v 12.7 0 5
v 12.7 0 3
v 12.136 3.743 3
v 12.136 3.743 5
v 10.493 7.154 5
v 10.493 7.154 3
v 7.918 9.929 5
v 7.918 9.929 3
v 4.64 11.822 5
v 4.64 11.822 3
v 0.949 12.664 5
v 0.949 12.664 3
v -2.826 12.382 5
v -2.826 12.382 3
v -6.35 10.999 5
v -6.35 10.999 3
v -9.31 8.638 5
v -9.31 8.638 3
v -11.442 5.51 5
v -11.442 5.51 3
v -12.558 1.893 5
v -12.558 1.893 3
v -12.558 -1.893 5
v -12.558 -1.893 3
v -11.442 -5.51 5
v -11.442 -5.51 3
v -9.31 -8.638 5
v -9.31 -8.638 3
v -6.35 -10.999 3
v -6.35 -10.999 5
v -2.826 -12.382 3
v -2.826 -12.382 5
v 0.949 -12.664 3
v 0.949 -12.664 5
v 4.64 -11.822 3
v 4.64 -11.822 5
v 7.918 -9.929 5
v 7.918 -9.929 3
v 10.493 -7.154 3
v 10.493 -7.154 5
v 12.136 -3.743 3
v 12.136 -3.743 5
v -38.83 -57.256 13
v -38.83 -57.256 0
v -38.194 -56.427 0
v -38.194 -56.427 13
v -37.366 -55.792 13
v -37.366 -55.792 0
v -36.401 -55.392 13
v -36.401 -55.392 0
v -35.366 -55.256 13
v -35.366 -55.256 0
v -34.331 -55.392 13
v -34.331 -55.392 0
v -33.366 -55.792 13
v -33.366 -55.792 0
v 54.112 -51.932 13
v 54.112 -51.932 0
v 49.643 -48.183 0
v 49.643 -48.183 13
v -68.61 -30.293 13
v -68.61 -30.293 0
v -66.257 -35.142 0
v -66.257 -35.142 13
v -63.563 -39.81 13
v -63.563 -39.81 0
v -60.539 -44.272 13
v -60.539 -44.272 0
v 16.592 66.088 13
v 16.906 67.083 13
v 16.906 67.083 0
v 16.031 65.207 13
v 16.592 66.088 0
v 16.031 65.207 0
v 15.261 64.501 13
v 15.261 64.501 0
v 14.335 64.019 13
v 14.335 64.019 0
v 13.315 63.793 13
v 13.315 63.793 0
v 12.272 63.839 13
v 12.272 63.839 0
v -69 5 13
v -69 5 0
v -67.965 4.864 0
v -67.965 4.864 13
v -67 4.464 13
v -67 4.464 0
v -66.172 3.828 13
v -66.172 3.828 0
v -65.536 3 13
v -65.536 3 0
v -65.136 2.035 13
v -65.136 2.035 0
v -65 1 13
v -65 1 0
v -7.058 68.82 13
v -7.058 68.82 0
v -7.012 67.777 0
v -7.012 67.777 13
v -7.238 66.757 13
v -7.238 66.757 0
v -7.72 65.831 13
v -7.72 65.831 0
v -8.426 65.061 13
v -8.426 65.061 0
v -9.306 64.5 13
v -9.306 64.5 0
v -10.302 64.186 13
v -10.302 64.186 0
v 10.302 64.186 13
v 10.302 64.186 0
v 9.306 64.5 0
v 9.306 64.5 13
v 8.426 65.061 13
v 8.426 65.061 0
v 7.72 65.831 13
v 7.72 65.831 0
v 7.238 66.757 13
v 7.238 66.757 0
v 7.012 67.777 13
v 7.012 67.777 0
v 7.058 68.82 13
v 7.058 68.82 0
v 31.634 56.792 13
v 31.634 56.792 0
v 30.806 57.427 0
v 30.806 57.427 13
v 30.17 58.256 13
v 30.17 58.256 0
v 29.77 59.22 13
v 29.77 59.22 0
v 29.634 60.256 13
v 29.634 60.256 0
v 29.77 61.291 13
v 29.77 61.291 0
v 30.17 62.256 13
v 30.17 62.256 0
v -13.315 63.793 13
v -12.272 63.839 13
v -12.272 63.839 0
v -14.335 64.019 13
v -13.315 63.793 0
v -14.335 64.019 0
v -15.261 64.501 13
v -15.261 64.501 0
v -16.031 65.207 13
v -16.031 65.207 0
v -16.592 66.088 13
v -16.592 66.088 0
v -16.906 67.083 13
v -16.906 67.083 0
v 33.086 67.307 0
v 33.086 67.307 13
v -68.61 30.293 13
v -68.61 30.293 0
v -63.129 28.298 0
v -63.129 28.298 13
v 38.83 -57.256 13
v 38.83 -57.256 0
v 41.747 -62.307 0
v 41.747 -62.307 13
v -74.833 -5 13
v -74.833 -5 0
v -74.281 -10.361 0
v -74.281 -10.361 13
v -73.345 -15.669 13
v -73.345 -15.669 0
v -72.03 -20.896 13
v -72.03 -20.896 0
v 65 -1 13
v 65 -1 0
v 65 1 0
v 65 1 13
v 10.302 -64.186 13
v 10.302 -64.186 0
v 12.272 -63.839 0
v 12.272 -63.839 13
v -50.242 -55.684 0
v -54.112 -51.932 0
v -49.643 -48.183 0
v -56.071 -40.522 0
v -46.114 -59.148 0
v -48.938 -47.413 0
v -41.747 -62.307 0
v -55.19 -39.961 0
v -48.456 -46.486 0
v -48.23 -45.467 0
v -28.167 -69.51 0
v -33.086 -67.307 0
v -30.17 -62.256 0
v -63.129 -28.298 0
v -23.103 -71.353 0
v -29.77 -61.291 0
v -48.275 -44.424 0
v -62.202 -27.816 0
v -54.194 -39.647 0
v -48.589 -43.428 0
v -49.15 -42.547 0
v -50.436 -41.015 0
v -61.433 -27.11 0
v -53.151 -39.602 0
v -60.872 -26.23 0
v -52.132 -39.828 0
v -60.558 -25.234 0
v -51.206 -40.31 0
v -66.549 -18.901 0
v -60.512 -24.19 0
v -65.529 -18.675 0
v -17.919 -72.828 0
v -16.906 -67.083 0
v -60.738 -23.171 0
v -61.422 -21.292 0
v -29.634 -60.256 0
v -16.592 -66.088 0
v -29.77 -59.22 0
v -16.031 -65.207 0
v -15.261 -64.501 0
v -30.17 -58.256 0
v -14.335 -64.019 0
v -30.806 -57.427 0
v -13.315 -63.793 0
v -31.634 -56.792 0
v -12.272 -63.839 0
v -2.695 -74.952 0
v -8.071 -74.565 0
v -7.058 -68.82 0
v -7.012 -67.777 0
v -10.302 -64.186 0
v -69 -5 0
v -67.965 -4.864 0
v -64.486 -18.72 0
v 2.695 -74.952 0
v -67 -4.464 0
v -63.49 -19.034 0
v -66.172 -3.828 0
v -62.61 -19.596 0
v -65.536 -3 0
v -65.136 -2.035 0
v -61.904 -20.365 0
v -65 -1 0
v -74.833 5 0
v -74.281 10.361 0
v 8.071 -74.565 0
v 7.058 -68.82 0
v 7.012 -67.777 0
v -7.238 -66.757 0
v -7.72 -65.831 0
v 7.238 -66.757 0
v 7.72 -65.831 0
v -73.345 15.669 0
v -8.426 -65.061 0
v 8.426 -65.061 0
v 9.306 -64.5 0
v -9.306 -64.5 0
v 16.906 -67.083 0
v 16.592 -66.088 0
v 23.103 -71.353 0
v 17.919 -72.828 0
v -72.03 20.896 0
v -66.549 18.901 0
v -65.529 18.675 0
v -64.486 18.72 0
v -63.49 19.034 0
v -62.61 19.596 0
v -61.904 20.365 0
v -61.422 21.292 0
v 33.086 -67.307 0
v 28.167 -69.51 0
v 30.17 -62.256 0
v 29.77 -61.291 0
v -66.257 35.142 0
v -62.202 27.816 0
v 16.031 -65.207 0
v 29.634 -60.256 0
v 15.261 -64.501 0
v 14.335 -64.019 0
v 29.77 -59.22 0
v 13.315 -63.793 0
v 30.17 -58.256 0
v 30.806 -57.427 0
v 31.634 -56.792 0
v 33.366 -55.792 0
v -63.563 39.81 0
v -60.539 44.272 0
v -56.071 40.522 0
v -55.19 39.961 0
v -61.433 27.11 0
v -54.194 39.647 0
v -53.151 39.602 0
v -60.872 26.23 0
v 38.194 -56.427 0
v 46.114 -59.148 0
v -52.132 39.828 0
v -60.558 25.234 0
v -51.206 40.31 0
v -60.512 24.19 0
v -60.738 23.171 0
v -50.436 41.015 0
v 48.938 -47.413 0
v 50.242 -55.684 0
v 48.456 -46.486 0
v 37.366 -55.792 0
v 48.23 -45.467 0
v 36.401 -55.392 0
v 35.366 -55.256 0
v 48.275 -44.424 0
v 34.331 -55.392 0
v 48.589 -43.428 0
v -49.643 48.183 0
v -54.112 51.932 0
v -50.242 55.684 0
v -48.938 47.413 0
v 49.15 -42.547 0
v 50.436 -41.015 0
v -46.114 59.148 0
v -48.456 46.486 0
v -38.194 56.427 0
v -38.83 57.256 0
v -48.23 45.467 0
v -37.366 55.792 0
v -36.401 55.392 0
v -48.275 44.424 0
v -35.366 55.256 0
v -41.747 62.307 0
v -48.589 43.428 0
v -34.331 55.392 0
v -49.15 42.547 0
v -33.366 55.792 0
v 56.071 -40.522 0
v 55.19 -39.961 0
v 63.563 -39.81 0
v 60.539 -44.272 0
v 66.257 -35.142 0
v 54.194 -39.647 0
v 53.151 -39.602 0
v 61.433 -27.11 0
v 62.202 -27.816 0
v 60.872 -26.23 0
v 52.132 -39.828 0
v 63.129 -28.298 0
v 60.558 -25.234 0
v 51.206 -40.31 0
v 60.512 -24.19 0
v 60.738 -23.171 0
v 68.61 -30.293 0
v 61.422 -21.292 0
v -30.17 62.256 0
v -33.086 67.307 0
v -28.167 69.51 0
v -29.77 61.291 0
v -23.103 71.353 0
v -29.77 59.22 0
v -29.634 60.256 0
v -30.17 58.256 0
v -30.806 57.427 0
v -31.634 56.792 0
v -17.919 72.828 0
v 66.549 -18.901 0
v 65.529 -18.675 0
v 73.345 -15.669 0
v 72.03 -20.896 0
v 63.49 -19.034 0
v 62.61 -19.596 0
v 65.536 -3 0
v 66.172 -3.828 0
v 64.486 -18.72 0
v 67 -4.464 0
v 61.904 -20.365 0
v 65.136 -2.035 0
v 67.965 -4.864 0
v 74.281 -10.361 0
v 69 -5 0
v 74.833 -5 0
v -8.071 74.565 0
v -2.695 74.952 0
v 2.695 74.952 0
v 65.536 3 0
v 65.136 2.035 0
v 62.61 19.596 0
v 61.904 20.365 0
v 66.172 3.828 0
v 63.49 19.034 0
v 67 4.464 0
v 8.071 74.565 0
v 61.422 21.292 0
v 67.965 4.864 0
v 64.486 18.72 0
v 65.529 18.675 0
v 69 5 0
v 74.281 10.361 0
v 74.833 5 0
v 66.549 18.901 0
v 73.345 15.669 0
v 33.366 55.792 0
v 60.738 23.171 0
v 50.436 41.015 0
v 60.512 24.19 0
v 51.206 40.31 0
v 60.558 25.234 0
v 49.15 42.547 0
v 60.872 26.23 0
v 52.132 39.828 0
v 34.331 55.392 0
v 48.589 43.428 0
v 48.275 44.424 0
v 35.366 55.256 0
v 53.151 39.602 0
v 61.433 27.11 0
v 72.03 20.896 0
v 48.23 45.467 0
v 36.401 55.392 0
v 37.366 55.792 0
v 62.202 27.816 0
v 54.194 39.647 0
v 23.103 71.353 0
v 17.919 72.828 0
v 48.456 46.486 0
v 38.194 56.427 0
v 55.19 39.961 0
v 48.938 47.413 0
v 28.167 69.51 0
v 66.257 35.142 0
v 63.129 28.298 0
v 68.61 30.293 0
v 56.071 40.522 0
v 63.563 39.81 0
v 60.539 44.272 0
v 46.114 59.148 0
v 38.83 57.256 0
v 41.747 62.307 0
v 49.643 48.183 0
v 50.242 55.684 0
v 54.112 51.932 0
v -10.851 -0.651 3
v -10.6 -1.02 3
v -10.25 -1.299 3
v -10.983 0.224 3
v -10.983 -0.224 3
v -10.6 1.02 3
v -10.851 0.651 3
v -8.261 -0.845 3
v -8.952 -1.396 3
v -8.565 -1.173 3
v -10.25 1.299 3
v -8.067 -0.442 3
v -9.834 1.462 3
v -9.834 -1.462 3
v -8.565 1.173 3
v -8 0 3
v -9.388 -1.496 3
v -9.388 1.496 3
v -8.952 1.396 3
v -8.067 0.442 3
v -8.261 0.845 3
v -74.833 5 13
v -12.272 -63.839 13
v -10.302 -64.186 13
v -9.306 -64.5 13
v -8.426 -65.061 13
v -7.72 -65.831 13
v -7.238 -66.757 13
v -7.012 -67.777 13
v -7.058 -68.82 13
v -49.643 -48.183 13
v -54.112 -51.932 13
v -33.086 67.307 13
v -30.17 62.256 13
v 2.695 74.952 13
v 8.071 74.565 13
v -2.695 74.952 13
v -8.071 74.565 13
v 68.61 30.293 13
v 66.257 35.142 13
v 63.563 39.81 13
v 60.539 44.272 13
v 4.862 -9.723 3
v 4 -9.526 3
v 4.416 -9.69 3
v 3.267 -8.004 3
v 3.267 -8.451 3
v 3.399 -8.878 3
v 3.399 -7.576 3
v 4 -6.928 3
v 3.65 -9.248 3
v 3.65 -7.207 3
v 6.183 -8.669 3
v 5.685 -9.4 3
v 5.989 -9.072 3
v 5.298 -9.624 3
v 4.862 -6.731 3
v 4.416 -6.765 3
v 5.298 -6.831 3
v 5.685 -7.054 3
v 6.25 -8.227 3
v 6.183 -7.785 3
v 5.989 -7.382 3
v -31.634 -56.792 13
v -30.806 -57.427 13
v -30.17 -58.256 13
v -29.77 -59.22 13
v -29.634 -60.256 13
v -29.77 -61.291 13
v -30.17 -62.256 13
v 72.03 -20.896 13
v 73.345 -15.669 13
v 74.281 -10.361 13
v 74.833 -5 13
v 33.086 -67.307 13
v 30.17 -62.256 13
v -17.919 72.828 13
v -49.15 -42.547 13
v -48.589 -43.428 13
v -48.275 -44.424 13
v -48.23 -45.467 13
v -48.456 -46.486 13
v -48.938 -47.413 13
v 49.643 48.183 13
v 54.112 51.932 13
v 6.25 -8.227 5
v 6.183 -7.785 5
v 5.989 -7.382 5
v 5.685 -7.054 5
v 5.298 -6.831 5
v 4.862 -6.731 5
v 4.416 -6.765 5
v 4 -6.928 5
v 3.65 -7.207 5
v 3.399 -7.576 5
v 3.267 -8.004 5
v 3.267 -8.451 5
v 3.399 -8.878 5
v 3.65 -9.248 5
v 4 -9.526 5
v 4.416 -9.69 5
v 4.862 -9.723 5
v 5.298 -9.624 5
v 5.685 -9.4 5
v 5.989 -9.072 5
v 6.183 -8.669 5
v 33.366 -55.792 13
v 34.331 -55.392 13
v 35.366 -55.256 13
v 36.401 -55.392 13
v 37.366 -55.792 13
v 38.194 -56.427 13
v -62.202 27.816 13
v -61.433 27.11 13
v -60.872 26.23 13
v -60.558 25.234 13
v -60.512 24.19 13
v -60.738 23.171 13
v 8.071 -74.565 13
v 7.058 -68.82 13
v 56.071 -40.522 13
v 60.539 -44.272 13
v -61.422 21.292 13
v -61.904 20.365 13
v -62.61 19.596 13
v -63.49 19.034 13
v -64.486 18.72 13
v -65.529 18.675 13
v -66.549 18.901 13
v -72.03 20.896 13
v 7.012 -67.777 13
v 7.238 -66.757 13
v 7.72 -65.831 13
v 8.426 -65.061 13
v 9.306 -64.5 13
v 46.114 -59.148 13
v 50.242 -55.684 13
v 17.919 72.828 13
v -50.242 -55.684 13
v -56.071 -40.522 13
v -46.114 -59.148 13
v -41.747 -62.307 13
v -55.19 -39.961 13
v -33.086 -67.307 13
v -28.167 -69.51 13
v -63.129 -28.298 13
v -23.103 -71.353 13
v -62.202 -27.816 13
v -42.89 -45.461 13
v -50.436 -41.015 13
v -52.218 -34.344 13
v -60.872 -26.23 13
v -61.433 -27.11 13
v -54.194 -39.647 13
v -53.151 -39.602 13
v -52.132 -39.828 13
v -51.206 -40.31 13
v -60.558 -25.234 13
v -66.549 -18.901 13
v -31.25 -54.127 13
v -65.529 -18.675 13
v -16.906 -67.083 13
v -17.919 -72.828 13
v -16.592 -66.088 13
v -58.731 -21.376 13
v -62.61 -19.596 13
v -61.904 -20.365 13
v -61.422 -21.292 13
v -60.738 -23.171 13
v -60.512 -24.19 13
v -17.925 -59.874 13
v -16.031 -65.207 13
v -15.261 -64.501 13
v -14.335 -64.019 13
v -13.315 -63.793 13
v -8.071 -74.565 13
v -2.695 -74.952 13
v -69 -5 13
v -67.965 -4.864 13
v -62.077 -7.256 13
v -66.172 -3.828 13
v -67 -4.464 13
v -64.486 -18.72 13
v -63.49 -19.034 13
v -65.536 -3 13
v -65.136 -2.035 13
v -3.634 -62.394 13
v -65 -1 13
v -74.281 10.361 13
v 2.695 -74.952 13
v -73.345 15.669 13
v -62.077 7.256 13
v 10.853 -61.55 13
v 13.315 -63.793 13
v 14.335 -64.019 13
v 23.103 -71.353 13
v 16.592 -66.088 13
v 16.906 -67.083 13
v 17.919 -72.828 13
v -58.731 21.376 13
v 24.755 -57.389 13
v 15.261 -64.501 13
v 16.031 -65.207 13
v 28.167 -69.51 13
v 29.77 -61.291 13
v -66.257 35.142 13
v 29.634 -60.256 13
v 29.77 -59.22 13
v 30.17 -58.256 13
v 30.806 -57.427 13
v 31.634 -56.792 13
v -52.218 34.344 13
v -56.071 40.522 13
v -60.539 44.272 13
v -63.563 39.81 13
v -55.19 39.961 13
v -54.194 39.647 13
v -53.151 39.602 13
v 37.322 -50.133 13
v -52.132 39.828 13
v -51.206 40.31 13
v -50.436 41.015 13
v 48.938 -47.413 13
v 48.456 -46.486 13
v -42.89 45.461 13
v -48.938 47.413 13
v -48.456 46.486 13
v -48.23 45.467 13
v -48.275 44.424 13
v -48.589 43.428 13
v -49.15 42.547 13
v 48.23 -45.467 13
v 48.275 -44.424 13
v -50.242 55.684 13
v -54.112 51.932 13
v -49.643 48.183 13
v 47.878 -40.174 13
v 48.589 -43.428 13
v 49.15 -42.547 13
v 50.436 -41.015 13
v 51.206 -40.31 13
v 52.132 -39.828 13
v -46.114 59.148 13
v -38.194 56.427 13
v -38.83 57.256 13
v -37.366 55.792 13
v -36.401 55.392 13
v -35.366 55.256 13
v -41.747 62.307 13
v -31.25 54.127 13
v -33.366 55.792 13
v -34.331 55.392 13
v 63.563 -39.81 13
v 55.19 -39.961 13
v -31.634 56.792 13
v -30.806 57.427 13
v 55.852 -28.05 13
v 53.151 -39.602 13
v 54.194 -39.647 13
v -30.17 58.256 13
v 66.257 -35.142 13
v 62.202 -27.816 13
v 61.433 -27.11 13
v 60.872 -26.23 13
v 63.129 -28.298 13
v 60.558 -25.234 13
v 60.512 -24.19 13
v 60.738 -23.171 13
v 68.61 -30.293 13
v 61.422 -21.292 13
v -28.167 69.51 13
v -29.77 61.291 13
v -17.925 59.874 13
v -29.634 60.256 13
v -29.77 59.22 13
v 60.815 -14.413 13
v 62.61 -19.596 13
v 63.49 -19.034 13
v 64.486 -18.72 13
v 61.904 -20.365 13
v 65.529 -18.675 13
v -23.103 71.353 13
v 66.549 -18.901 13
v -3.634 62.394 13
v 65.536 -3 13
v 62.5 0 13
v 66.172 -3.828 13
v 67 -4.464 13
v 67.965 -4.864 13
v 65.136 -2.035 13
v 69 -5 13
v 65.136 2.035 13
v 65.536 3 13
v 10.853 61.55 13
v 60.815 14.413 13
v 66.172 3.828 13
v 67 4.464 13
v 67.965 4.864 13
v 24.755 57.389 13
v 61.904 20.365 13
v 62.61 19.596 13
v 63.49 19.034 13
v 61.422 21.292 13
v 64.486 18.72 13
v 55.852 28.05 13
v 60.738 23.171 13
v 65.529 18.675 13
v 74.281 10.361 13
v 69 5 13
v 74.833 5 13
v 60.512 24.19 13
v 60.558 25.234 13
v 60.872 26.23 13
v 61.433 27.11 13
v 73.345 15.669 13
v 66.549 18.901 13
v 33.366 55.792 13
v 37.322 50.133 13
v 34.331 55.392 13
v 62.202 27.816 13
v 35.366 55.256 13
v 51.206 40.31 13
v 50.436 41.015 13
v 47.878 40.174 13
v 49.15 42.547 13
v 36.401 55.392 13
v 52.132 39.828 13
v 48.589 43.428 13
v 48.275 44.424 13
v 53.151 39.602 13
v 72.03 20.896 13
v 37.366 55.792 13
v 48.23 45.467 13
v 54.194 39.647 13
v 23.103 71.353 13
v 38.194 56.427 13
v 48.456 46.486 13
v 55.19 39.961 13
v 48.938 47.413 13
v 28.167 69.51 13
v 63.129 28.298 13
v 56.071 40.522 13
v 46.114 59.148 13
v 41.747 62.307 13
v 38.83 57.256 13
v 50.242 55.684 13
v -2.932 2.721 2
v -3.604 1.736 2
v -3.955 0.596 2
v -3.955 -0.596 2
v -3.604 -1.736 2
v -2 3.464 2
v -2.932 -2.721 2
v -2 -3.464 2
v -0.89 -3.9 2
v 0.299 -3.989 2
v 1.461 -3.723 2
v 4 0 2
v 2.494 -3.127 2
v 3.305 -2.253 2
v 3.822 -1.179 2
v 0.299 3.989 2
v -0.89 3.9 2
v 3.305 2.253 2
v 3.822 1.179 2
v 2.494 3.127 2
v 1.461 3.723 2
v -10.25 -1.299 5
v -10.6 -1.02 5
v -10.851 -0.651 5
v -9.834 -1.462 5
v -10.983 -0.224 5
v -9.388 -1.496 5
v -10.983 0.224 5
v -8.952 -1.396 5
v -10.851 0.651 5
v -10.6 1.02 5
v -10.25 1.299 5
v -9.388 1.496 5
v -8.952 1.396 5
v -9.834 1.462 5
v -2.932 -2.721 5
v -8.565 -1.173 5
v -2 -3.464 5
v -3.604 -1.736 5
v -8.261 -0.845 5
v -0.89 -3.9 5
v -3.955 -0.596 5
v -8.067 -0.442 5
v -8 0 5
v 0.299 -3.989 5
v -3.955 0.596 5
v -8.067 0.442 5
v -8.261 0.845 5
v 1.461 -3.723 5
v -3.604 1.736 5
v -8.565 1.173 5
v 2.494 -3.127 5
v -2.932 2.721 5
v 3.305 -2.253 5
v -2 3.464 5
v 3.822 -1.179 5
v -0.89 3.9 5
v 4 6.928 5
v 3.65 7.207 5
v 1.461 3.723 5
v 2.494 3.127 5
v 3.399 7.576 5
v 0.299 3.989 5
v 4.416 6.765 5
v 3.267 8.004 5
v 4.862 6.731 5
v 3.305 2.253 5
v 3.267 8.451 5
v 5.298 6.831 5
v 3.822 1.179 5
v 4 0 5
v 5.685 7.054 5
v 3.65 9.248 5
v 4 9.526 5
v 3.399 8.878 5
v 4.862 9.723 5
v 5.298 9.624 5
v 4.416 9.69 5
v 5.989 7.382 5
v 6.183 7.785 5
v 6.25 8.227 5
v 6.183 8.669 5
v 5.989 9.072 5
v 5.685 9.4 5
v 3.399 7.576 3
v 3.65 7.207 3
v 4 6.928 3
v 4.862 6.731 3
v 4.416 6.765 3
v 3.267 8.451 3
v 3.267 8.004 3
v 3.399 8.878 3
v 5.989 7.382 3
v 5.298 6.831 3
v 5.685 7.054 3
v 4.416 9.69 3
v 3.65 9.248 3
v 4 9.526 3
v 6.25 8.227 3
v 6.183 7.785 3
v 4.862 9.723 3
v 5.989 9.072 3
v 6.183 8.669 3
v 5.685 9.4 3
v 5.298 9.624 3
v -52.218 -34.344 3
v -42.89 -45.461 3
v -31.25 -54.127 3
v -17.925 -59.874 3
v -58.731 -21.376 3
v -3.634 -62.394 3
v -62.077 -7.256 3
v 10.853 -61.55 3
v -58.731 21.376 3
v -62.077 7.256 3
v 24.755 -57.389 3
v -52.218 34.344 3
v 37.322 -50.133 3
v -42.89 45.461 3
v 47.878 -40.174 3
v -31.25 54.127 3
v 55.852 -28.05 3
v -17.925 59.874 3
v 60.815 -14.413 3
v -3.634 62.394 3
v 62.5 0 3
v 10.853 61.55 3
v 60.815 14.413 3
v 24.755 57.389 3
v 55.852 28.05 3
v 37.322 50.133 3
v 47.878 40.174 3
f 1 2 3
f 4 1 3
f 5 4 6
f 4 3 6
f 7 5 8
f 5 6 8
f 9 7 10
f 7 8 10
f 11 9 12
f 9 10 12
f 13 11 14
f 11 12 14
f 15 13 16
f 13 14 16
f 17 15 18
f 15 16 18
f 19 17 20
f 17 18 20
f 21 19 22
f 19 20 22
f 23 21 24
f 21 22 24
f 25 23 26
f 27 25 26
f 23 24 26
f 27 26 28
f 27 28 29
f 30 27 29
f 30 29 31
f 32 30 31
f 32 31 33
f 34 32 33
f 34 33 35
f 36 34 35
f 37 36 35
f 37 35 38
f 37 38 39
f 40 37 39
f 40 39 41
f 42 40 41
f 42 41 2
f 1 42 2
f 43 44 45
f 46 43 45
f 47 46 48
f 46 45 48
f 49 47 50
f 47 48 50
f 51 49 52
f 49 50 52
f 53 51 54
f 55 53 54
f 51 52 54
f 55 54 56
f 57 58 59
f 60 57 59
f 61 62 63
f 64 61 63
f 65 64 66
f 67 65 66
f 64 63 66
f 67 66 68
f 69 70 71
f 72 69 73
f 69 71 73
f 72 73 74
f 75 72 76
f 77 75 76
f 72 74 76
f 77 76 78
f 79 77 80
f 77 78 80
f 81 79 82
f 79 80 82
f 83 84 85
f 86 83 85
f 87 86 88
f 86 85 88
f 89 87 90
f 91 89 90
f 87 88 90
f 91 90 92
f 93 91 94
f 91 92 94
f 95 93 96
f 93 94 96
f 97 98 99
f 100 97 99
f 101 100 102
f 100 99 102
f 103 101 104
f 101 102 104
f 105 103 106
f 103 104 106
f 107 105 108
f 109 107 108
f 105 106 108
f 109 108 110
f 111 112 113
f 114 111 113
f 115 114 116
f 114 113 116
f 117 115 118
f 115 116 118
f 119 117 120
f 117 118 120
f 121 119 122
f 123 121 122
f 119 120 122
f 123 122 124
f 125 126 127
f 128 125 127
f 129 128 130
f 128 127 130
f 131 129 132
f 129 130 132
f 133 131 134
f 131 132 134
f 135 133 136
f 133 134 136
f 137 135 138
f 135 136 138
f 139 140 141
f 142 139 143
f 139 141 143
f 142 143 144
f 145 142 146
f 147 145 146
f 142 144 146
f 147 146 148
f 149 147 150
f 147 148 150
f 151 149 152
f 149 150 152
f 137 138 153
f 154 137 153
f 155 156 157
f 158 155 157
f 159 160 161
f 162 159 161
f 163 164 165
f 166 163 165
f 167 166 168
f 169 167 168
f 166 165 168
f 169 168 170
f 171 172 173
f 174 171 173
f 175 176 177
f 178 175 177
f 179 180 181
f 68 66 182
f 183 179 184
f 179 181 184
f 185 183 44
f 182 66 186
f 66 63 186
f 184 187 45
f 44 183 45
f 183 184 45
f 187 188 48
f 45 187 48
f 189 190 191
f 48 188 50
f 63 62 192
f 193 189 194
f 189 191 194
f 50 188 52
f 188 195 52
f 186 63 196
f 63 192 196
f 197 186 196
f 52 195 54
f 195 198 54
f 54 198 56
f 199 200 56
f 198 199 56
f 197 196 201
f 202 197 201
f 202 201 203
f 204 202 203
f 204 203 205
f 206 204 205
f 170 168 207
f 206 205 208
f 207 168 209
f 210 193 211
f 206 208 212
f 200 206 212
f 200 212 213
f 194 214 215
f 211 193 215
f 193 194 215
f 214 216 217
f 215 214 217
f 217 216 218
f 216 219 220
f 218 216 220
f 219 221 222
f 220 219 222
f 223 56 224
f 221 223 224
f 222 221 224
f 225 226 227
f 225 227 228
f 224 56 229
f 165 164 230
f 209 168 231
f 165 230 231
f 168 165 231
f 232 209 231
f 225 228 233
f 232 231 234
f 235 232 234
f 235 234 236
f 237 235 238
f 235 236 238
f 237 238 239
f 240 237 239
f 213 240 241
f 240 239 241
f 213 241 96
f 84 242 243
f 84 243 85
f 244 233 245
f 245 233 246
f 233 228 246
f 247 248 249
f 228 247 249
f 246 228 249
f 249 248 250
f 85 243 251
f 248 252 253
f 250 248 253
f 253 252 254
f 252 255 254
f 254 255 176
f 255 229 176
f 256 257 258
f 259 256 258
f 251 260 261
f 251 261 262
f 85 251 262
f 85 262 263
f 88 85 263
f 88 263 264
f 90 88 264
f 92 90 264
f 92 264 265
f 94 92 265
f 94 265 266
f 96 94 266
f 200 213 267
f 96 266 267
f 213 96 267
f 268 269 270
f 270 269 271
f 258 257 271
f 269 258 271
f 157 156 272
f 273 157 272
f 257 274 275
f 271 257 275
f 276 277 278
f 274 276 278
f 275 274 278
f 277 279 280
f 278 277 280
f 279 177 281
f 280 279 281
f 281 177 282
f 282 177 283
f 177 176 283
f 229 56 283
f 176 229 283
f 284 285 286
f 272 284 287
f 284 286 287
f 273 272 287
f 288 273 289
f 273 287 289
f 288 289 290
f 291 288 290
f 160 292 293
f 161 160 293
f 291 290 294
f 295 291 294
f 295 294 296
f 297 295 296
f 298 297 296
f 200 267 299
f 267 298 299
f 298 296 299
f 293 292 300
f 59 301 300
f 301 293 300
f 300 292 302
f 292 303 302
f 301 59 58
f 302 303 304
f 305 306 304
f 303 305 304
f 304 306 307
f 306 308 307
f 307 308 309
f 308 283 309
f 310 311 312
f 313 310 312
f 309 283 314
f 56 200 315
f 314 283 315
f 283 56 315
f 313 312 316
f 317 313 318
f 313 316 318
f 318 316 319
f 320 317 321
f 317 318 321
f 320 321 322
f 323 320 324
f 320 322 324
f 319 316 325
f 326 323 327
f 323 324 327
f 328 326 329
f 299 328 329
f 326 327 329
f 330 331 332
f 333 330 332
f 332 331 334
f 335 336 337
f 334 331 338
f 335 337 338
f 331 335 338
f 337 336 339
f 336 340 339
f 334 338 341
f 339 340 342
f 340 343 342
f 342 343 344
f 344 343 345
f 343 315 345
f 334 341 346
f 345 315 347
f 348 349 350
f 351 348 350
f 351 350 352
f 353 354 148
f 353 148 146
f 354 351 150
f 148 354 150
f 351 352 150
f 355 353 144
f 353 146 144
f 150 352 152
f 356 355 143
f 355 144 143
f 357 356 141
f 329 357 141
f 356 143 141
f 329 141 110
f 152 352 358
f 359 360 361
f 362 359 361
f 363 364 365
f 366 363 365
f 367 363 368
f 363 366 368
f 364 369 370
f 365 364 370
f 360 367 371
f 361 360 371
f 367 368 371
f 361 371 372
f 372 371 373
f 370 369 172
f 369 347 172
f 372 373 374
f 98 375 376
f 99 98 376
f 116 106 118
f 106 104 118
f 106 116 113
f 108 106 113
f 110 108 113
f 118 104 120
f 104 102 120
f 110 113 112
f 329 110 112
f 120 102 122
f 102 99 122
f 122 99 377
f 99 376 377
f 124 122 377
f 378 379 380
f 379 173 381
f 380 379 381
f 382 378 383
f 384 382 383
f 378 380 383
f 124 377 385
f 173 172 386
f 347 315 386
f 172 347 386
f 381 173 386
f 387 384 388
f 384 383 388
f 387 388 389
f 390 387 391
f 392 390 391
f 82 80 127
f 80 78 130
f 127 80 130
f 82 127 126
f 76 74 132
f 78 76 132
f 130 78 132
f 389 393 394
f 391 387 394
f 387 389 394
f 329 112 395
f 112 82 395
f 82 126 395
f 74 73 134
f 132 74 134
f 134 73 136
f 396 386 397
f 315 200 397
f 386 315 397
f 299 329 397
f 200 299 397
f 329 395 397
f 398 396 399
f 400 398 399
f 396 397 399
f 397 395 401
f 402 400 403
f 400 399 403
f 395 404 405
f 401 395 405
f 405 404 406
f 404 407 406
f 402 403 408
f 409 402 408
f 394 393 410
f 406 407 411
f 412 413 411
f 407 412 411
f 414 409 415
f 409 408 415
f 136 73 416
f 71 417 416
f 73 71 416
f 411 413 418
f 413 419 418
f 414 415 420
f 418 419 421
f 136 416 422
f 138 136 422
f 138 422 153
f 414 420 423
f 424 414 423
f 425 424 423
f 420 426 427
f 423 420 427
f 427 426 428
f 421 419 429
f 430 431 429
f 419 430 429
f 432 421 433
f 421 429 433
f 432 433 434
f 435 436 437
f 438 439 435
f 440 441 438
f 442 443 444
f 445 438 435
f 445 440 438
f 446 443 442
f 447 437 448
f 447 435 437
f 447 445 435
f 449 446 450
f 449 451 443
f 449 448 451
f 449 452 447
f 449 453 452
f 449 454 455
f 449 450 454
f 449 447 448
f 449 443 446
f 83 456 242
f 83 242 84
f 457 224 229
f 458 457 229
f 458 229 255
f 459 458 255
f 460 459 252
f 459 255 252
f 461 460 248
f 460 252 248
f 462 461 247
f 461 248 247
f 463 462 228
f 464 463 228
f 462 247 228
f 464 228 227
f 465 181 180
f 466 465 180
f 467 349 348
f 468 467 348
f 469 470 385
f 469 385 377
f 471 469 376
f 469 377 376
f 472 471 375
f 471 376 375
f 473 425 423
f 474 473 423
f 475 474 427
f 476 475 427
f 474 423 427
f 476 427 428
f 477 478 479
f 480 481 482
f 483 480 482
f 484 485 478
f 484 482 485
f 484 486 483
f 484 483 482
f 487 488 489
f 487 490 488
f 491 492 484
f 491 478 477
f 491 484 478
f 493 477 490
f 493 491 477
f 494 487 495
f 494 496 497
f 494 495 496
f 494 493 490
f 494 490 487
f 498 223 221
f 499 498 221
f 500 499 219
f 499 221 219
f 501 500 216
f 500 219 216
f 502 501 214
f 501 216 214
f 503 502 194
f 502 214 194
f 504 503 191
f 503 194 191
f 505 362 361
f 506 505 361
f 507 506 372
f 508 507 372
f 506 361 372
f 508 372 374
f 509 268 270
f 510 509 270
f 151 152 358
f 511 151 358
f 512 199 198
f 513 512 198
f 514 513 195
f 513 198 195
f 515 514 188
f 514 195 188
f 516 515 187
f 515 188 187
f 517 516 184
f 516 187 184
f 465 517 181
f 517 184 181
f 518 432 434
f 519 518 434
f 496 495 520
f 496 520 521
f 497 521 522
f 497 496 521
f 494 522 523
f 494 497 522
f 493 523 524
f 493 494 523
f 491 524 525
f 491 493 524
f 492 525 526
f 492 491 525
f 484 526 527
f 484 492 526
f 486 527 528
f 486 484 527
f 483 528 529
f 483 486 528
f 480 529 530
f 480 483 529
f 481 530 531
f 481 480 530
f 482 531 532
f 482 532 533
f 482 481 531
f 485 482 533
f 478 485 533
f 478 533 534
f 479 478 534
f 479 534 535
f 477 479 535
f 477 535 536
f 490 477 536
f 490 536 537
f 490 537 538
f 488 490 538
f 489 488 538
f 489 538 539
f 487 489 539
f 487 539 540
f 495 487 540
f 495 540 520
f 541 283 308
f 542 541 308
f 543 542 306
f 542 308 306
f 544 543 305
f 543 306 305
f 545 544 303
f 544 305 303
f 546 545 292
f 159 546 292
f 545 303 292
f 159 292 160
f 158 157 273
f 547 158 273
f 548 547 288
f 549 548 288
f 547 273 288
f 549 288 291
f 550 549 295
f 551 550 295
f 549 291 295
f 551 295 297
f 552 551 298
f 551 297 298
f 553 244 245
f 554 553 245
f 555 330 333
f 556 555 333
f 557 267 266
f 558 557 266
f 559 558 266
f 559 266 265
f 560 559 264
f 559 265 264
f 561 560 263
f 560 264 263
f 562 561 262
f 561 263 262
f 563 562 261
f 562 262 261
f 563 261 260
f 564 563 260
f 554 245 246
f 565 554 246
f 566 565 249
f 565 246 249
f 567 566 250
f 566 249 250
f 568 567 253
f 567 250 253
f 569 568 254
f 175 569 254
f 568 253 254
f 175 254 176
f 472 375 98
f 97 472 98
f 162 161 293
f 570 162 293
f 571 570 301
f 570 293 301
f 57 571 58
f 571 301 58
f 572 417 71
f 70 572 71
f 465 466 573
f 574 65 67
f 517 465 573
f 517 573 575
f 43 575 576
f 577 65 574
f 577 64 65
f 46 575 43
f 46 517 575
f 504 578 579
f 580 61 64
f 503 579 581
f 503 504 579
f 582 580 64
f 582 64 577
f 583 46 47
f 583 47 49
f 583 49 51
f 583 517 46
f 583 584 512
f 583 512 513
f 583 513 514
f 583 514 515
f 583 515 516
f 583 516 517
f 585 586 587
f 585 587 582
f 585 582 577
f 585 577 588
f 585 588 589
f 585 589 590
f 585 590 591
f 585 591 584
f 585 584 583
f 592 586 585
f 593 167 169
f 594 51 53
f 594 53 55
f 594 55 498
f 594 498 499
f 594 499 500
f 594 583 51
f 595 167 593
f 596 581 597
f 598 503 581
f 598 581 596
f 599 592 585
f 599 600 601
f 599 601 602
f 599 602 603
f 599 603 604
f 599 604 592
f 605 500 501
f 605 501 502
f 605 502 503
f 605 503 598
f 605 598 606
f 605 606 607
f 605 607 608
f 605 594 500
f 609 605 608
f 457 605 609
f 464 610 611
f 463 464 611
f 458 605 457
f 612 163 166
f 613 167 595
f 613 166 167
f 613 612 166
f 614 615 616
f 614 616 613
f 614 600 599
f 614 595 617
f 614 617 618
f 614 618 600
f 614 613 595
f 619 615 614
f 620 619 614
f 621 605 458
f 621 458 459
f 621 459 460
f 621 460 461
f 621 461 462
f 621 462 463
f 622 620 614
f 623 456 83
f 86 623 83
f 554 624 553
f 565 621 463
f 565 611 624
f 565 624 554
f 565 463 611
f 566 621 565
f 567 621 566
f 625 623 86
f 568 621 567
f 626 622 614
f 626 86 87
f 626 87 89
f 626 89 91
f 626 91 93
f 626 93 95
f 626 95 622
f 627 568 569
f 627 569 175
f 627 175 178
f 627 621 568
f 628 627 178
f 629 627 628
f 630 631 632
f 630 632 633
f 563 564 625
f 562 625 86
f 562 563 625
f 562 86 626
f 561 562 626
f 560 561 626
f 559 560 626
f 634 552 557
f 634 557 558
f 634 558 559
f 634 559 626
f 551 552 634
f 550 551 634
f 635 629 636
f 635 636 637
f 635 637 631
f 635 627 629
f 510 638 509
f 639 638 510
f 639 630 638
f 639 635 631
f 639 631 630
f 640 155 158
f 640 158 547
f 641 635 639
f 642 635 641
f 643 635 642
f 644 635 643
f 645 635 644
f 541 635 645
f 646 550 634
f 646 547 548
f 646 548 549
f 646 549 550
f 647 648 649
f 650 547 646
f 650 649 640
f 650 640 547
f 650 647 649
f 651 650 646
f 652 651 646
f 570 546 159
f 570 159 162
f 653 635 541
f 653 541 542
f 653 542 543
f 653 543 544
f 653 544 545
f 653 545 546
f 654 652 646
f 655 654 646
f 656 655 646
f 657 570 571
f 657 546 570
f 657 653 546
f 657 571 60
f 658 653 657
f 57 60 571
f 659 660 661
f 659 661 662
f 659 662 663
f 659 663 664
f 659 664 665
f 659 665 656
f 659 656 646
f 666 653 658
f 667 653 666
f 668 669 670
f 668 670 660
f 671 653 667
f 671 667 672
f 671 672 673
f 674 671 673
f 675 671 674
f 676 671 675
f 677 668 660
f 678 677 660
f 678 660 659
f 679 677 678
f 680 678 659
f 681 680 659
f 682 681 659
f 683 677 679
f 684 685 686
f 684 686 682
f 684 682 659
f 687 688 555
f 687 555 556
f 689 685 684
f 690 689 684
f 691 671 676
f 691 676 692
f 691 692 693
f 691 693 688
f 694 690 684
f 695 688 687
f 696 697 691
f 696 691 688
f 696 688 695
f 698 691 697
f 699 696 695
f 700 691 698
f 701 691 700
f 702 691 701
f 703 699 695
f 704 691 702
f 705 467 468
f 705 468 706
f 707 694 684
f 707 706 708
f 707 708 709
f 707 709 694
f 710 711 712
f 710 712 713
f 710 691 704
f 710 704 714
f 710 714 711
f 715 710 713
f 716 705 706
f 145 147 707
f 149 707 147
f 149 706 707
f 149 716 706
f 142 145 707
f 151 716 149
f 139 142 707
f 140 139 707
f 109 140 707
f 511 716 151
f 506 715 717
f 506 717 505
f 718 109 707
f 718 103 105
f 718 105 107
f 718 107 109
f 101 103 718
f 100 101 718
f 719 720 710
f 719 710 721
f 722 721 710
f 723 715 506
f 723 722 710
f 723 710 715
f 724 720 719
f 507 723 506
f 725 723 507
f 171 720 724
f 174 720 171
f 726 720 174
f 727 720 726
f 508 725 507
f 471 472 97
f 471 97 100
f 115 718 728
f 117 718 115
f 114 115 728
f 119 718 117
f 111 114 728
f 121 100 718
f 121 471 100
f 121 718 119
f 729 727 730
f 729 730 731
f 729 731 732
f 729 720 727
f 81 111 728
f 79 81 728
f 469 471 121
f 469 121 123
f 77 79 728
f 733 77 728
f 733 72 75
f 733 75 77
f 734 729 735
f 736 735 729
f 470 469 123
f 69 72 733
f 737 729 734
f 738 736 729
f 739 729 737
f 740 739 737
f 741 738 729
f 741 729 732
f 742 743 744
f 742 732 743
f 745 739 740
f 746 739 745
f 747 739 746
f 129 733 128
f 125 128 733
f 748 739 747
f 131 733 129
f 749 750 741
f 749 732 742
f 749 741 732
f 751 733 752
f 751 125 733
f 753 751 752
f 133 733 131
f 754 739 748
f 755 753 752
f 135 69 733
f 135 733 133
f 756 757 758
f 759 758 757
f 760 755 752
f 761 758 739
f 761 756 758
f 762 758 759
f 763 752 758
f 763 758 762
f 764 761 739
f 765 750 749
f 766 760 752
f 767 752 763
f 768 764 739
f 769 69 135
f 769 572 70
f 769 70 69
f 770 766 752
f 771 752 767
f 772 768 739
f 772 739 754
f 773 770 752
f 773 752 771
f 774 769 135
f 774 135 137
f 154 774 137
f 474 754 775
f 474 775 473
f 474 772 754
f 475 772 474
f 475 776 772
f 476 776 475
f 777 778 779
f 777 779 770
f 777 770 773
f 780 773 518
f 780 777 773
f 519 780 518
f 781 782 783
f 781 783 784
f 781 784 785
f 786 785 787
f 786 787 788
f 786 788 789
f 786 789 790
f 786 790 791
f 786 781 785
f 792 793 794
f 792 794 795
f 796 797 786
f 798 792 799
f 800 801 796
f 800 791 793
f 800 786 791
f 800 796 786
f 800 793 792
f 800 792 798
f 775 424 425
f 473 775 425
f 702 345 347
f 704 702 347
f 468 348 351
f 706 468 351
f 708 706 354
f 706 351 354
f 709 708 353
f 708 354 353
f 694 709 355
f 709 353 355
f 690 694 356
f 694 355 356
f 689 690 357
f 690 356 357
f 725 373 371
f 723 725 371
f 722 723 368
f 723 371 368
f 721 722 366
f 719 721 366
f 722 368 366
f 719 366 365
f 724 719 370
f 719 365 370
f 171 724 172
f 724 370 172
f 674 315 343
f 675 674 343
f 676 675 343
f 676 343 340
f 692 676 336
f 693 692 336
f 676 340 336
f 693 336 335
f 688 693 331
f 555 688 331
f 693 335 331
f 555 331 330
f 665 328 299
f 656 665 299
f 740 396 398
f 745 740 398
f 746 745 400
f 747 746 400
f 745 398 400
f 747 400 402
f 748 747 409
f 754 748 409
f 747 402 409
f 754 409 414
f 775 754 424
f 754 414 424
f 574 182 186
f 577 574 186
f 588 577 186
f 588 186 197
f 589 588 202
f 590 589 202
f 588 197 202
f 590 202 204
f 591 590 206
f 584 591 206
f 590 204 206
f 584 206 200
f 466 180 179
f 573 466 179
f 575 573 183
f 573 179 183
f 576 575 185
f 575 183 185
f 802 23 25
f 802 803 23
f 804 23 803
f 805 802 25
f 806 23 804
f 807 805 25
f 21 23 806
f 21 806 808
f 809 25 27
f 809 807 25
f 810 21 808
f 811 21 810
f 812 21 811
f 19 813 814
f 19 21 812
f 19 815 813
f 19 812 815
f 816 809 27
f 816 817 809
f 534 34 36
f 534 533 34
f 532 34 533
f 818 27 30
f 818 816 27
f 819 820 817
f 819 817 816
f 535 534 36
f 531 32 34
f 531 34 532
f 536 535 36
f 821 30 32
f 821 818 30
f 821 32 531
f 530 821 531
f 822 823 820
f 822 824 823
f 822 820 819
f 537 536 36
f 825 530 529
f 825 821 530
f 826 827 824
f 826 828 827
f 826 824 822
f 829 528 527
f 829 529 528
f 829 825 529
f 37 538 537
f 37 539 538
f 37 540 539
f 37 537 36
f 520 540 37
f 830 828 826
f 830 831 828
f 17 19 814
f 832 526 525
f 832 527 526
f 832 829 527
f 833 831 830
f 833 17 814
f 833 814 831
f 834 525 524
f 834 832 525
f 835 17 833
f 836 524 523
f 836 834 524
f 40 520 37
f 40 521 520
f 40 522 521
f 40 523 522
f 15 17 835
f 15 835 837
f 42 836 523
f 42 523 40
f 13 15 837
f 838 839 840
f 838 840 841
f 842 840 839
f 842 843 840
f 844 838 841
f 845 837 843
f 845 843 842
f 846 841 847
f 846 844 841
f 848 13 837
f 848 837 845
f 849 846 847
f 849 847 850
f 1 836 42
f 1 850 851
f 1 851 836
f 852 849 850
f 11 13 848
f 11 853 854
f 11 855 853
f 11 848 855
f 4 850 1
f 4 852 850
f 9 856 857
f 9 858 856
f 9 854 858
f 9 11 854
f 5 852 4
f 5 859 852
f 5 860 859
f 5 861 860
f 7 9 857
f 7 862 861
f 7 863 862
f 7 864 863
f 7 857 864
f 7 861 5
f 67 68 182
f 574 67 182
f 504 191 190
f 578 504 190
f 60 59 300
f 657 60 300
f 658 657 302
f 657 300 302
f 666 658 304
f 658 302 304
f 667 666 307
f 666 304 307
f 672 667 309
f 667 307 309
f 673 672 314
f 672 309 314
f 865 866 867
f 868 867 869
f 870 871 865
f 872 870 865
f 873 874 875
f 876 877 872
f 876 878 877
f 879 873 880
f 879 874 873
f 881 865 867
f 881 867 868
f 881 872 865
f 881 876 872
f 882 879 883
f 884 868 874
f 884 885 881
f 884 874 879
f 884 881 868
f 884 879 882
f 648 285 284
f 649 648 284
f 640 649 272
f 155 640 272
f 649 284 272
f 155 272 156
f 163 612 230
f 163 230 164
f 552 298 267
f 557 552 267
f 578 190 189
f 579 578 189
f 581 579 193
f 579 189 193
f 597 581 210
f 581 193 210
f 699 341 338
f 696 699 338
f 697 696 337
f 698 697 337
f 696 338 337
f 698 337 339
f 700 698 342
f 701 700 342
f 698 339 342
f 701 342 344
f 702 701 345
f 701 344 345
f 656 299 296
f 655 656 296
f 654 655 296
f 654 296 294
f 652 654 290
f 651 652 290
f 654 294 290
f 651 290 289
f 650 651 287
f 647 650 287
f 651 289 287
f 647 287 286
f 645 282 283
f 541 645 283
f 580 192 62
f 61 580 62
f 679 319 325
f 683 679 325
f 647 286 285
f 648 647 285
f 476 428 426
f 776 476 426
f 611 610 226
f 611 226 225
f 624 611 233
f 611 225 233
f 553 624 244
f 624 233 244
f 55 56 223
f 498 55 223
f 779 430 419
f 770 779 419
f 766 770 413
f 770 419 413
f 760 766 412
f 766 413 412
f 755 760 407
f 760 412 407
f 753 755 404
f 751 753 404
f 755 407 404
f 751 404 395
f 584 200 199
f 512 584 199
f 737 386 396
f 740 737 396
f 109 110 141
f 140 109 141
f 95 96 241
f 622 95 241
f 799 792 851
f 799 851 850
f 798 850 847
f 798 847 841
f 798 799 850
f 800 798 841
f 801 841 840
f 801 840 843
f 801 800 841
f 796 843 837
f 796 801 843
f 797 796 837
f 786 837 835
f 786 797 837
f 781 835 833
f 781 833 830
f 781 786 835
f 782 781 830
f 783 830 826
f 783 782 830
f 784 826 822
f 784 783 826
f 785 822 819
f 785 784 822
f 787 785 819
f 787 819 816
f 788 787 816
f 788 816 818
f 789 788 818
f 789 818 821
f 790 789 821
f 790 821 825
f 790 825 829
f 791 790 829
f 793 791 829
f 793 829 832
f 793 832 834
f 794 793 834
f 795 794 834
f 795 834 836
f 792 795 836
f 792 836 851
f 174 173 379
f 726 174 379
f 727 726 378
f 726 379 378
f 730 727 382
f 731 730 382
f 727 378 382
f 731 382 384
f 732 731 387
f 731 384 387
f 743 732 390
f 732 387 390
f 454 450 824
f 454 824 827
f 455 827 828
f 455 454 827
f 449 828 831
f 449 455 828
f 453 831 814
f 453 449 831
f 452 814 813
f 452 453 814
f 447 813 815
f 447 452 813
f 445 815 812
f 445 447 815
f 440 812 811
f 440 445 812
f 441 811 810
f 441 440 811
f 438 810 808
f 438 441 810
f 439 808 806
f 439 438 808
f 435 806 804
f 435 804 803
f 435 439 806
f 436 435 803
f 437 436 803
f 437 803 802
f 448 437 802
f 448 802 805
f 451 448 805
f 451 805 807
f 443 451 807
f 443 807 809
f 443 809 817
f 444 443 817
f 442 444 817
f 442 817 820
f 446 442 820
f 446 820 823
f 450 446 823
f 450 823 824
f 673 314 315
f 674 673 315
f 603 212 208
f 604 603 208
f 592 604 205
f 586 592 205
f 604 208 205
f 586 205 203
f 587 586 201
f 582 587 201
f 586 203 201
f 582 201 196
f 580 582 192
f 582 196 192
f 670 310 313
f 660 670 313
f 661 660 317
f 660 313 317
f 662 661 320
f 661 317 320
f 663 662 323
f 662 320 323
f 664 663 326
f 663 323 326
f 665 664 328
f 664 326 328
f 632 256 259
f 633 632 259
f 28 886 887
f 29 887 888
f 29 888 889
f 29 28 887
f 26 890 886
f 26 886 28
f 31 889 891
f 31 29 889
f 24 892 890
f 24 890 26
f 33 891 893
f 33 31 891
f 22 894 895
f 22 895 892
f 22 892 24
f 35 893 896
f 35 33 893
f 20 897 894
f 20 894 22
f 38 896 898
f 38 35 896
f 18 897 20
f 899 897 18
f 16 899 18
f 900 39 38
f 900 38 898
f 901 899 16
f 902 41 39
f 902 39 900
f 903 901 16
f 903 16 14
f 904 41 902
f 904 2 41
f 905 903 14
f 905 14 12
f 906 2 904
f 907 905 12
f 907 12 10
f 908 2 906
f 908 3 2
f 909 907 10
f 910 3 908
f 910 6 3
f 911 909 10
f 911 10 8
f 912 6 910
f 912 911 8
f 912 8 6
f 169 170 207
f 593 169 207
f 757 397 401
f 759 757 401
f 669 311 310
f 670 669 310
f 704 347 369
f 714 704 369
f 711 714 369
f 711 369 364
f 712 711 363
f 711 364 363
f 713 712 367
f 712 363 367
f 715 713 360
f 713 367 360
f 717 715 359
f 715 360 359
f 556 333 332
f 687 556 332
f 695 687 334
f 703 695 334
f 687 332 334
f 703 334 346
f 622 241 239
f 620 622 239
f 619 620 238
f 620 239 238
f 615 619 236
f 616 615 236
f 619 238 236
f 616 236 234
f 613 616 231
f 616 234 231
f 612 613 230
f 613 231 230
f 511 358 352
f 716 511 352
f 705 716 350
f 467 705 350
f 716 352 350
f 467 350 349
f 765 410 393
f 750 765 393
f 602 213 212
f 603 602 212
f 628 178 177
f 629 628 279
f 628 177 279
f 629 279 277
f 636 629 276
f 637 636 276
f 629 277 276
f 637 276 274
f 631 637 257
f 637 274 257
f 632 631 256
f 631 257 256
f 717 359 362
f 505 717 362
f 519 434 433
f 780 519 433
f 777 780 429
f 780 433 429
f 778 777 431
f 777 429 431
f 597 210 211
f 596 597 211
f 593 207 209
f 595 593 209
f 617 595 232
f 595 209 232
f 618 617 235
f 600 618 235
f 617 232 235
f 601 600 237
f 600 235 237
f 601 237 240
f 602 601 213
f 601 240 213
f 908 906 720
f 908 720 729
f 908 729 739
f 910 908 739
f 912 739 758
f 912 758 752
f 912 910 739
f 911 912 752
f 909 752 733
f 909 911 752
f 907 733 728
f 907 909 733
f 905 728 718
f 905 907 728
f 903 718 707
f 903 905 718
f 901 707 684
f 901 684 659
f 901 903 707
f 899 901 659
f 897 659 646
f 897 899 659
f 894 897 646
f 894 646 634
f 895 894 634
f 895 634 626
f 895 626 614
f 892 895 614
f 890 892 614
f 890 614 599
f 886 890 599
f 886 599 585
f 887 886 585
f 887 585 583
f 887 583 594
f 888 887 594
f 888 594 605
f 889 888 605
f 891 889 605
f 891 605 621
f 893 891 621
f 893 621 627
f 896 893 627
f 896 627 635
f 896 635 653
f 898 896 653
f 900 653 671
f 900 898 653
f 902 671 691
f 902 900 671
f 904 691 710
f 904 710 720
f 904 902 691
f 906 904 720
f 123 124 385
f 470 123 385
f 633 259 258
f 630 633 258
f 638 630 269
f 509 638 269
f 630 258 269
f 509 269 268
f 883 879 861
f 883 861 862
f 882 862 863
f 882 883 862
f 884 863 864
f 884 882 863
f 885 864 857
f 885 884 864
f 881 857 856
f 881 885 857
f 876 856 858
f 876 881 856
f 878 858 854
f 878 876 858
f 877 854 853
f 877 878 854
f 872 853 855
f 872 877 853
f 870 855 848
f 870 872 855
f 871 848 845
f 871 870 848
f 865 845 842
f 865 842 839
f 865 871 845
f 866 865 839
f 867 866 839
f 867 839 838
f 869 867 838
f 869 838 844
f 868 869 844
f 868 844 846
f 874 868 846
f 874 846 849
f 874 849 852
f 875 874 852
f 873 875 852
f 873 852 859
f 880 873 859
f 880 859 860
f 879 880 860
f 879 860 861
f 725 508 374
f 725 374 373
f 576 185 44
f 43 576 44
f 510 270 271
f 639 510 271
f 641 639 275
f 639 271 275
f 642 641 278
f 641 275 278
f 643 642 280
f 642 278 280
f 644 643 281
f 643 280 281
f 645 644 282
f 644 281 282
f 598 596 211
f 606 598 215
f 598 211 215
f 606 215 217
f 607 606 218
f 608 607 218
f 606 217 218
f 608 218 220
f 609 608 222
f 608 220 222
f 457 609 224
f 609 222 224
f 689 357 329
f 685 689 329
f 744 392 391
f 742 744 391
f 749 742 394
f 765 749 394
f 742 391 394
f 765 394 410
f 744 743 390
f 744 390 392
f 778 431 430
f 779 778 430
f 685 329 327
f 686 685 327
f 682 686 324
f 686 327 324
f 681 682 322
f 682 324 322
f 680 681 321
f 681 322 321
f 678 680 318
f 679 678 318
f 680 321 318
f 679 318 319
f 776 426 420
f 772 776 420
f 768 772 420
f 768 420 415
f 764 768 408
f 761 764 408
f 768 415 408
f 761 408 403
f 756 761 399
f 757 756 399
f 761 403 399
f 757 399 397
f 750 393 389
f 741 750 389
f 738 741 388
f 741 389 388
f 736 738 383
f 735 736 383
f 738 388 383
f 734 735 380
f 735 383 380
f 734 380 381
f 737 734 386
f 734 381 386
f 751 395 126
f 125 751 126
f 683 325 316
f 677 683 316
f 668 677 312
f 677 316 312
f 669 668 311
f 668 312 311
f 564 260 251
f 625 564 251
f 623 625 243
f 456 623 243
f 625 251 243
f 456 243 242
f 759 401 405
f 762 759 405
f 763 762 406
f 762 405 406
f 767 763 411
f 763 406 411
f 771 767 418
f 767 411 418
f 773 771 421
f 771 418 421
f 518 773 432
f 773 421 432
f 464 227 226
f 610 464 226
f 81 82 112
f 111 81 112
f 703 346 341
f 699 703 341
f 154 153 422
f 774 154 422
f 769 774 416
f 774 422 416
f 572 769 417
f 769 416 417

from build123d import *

# Parameters (mm, degrees)
F0_R     = 62.5
F0_R_2   = 12.7
F0_R_3   = 1.5
F0_R_4   = 4
F1_DEPTH = 3
F2_DEPTH = 13
F3_DEPTH = 5
F4_DEPTH = 2


with BuildPart() as f1:
    # F0 (on Top) → F1 (new body)
    with BuildSketch(Plane.XY):
        Circle(F0_R)
        Circle(F0_R_2, mode=Mode.SUBTRACT)
        Circle(F0_R_2)
        with Locations((-4.75, -8.227241)):
            Circle(F0_R_3, mode=Mode.SUBTRACT)
        with Locations((4.75, -8.227241)):
            Circle(F0_R_3, mode=Mode.SUBTRACT)
        with Locations((-9.5, 0)):
            Circle(F0_R_3, mode=Mode.SUBTRACT)
        with Locations((-4.75, 8.227241)):
            Circle(F0_R_3, mode=Mode.SUBTRACT)
        Circle(F0_R_4, mode=Mode.SUBTRACT)
        with Locations((4.75, 8.227241)):
            Circle(F0_R_3, mode=Mode.SUBTRACT)
        with Locations((9.5, 0)):
            Circle(F0_R_3, mode=Mode.SUBTRACT)
        with Locations((9.5, 0)):
            Circle(F0_R_3)
        with Locations((4.75, 8.227241)):
            Circle(F0_R_3)
        with Locations((-4.75, 8.227241)):
            Circle(F0_R_3)
        with Locations((-9.5, 0)):
            Circle(F0_R_3)
        with Locations((-4.75, -8.227241)):
            Circle(F0_R_3)
        with Locations((4.75, -8.227241)):
            Circle(F0_R_3)
    extrude(amount=F1_DEPTH)

    # F0 (on Top) → F2 (join)
    with BuildSketch(Plane.XY):
        with BuildLine():
            Line((69, 5), (74.833148, 5))
            ThreePointArc((74.833148, 5), (73.860581, 13.023613), (72.030257, 20.895981))
            Line((72.030257, 20.895981), (66.548892, 18.900927))
            ThreePointArc((66.548892, 18.900927), (63.490338, 19.034466), (61.42204, 21.291617))
            Line((61.42204, 21.291617), (60.738, 23.171002))
            ThreePointArc((60.738, 23.171002), (60.87154, 26.229556), (63.12869, 28.297853))
            Line((63.12869, 28.297853), (68.610056, 30.292907))
            ThreePointArc((68.610056, 30.292907), (64.951905, 37.5), (60.539455, 44.271598))
            Line((60.539455, 44.271598), (56.071005, 40.522123))
            ThreePointArc((56.071005, 40.522123), (53.151231, 39.601522), (50.435676, 41.01515))
            Line((50.435676, 41.01515), (49.150101, 42.547239))
            ThreePointArc((49.150101, 42.547239), (48.2295, 45.467012), (49.643129, 48.182567))
            Line((49.643129, 48.182567), (54.111579, 51.932042))
            ThreePointArc((54.111579, 51.932042), (48.209071, 57.453333), (41.746701, 62.307407))
            Line((41.746701, 62.307407), (38.830127, 57.255753))
            ThreePointArc((38.830127, 57.255753), (36.401302, 55.39205), (33.366025, 55.791651))
            Line((33.366025, 55.791651), (31.633975, 56.791651))
            ThreePointArc((31.633975, 56.791651), (29.770271, 59.220477), (30.169873, 62.255753))
            Line((30.169873, 62.255753), (33.086447, 67.307407))
            ThreePointArc((33.086447, 67.307407), (25.651511, 70.476947), (17.918678, 72.828023))
            Line((17.918678, 72.828023), (16.905763, 67.083494))
            ThreePointArc((16.905763, 67.083494), (15.260838, 64.501479), (12.271939, 63.838856))
            Line((12.271939, 63.838856), (10.302324, 64.186152))
            ThreePointArc((10.302324, 64.186152), (7.720308, 65.831077), (7.057685, 68.819976))
            Line((7.057685, 68.819976), (8.070601, 74.564505))
            ThreePointArc((8.070601, 74.564505), (0, 75), (-8.070601, 74.564505))
            Line((-8.070601, 74.564505), (-7.057685, 68.819976))
            ThreePointArc((-7.057685, 68.819976), (-7.720308, 65.831077), (-10.302324, 64.186152))
            Line((-10.302324, 64.186152), (-12.271939, 63.838856))
            ThreePointArc((-12.271939, 63.838856), (-15.260838, 64.501479), (-16.905763, 67.083494))
            Line((-16.905763, 67.083494), (-17.918678, 72.828023))
            ThreePointArc((-17.918678, 72.828023), (-25.651511, 70.476947), (-33.086447, 67.307407))
            Line((-33.086447, 67.307407), (-30.169873, 62.255753))
            ThreePointArc((-30.169873, 62.255753), (-29.770271, 59.220477), (-31.633975, 56.791651))
            Line((-31.633975, 56.791651), (-33.366025, 55.791651))
            ThreePointArc((-33.366025, 55.791651), (-36.401302, 55.39205), (-38.830127, 57.255753))
            Line((-38.830127, 57.255753), (-41.746701, 62.307407))
            ThreePointArc((-41.746701, 62.307407), (-48.209071, 57.453333), (-54.111579, 51.932042))
            Line((-54.111579, 51.932042), (-49.643129, 48.182567))
            ThreePointArc((-49.643129, 48.182567), (-48.2295, 45.467012), (-49.150101, 42.547239))
            Line((-49.150101, 42.547239), (-50.435676, 41.01515))
            ThreePointArc((-50.435676, 41.01515), (-53.151231, 39.601522), (-56.071005, 40.522123))
            Line((-56.071005, 40.522123), (-60.539455, 44.271598))
            ThreePointArc((-60.539455, 44.271598), (-64.951905, 37.5), (-68.610056, 30.292907))
            Line((-68.610056, 30.292907), (-63.12869, 28.297853))
            ThreePointArc((-63.12869, 28.297853), (-60.87154, 26.229556), (-60.738, 23.171002))
            Line((-60.738, 23.171002), (-61.42204, 21.291617))
            ThreePointArc((-61.42204, 21.291617), (-63.490338, 19.034466), (-66.548892, 18.900927))
            Line((-66.548892, 18.900927), (-72.030257, 20.895981))
            ThreePointArc((-72.030257, 20.895981), (-73.860581, 13.023613), (-74.833148, 5))
            Line((-74.833148, 5), (-69, 5))
            ThreePointArc((-69, 5), (-66.171573, 3.828427), (-65, 1))
            Line((-65, 1), (-65, -1))
            ThreePointArc((-65, -1), (-66.171573, -3.828427), (-69, -5))
            Line((-69, -5), (-74.833148, -5))
            ThreePointArc((-74.833148, -5), (-73.860581, -13.023613), (-72.030257, -20.895981))
            Line((-72.030257, -20.895981), (-66.548892, -18.900927))
            ThreePointArc((-66.548892, -18.900927), (-63.490338, -19.034466), (-61.42204, -21.291617))
            Line((-61.42204, -21.291617), (-60.738, -23.171002))
            ThreePointArc((-60.738, -23.171002), (-60.87154, -26.229556), (-63.12869, -28.297853))
            Line((-63.12869, -28.297853), (-68.610056, -30.292907))
            ThreePointArc((-68.610056, -30.292907), (-64.951905, -37.5), (-60.539455, -44.271598))
            Line((-60.539455, -44.271598), (-56.071005, -40.522123))
            ThreePointArc((-56.071005, -40.522123), (-53.151231, -39.601522), (-50.435676, -41.01515))
            Line((-50.435676, -41.01515), (-49.150101, -42.547239))
            ThreePointArc((-49.150101, -42.547239), (-48.2295, -45.467012), (-49.643129, -48.182567))
            Line((-49.643129, -48.182567), (-54.111579, -51.932042))
            ThreePointArc((-54.111579, -51.932042), (-48.209071, -57.453333), (-41.746701, -62.307407))
            Line((-41.746701, -62.307407), (-38.830127, -57.255753))
            ThreePointArc((-38.830127, -57.255753), (-36.401302, -55.39205), (-33.366025, -55.791651))
            Line((-33.366025, -55.791651), (-31.633975, -56.791651))
            ThreePointArc((-31.633975, -56.791651), (-29.770271, -59.220477), (-30.169873, -62.255753))
            Line((-30.169873, -62.255753), (-33.086447, -67.307407))
            ThreePointArc((-33.086447, -67.307407), (-25.651511, -70.476947), (-17.918678, -72.828023))
            Line((-17.918678, -72.828023), (-16.905763, -67.083494))
            ThreePointArc((-16.905763, -67.083494), (-15.260838, -64.501479), (-12.271939, -63.838856))
            Line((-12.271939, -63.838856), (-10.302324, -64.186152))
            ThreePointArc((-10.302324, -64.186152), (-7.720308, -65.831077), (-7.057685, -68.819976))
            Line((-7.057685, -68.819976), (-8.070601, -74.564505))
            ThreePointArc((-8.070601, -74.564505), (0, -75), (8.070601, -74.564505))
            Line((8.070601, -74.564505), (7.057685, -68.819976))
            ThreePointArc((7.057685, -68.819976), (7.720308, -65.831077), (10.302324, -64.186152))
            Line((10.302324, -64.186152), (12.271939, -63.838856))
            ThreePointArc((12.271939, -63.838856), (15.260838, -64.501479), (16.905763, -67.083494))
            Line((16.905763, -67.083494), (17.918678, -72.828023))
            ThreePointArc((17.918678, -72.828023), (25.651511, -70.476947), (33.086447, -67.307407))
            Line((33.086447, -67.307407), (30.169873, -62.255753))
            ThreePointArc((30.169873, -62.255753), (29.770271, -59.220477), (31.633975, -56.791651))
            Line((31.633975, -56.791651), (33.366025, -55.791651))
            ThreePointArc((33.366025, -55.791651), (36.401302, -55.39205), (38.830127, -57.255753))
            Line((38.830127, -57.255753), (41.746701, -62.307407))
            ThreePointArc((41.746701, -62.307407), (48.209071, -57.453333), (54.111579, -51.932042))
            Line((54.111579, -51.932042), (49.643129, -48.182567))
            ThreePointArc((49.643129, -48.182567), (48.2295, -45.467012), (49.150101, -42.547239))
            Line((49.150101, -42.547239), (50.435676, -41.01515))
            ThreePointArc((50.435676, -41.01515), (53.151231, -39.601522), (56.071005, -40.522123))
            Line((56.071005, -40.522123), (60.539455, -44.271598))
            ThreePointArc((60.539455, -44.271598), (64.951905, -37.5), (68.610056, -30.292907))
            Line((68.610056, -30.292907), (63.12869, -28.297853))
            ThreePointArc((63.12869, -28.297853), (60.87154, -26.229556), (60.738, -23.171002))
            Line((60.738, -23.171002), (61.42204, -21.291617))
            ThreePointArc((61.42204, -21.291617), (63.490338, -19.034466), (66.548892, -18.900927))
            Line((66.548892, -18.900927), (72.030257, -20.895981))
            ThreePointArc((72.030257, -20.895981), (73.860581, -13.023613), (74.833148, -5))
            Line((74.833148, -5), (69, -5))
            ThreePointArc((69, -5), (66.171573, -3.828427), (65, -1))
            Line((65, -1), (65, 1))
            ThreePointArc((65, 1), (66.171573, 3.828427), (69, 5))
        make_face()
        Circle(F0_R, mode=Mode.SUBTRACT)
    extrude(amount=F2_DEPTH)

    # F0 (on Top) → F3 (join)
    with BuildSketch(Plane.XY):
        Circle(F0_R_2)
        with Locations((-4.75, -8.227241)):
            Circle(F0_R_3, mode=Mode.SUBTRACT)
        with Locations((4.75, -8.227241)):
            Circle(F0_R_3, mode=Mode.SUBTRACT)
        with Locations((-9.5, 0)):
            Circle(F0_R_3, mode=Mode.SUBTRACT)
        with Locations((-4.75, 8.227241)):
            Circle(F0_R_3, mode=Mode.SUBTRACT)
        Circle(F0_R_4, mode=Mode.SUBTRACT)
        with Locations((4.75, 8.227241)):
            Circle(F0_R_3, mode=Mode.SUBTRACT)
        with Locations((9.5, 0)):
            Circle(F0_R_3, mode=Mode.SUBTRACT)
        with Locations((-4.75, 8.227241)):
            Circle(F0_R_3)
        with Locations((9.5, 0)):
            Circle(F0_R_3)
        with Locations((-4.75, -8.227241)):
            Circle(F0_R_3)
    extrude(amount=F3_DEPTH)

    # F0 (on Top) → F4 (join)
    with BuildSketch(Plane.XY):
        Circle(F0_R_4)
    extrude(amount=F4_DEPTH)


solid = f1.part
